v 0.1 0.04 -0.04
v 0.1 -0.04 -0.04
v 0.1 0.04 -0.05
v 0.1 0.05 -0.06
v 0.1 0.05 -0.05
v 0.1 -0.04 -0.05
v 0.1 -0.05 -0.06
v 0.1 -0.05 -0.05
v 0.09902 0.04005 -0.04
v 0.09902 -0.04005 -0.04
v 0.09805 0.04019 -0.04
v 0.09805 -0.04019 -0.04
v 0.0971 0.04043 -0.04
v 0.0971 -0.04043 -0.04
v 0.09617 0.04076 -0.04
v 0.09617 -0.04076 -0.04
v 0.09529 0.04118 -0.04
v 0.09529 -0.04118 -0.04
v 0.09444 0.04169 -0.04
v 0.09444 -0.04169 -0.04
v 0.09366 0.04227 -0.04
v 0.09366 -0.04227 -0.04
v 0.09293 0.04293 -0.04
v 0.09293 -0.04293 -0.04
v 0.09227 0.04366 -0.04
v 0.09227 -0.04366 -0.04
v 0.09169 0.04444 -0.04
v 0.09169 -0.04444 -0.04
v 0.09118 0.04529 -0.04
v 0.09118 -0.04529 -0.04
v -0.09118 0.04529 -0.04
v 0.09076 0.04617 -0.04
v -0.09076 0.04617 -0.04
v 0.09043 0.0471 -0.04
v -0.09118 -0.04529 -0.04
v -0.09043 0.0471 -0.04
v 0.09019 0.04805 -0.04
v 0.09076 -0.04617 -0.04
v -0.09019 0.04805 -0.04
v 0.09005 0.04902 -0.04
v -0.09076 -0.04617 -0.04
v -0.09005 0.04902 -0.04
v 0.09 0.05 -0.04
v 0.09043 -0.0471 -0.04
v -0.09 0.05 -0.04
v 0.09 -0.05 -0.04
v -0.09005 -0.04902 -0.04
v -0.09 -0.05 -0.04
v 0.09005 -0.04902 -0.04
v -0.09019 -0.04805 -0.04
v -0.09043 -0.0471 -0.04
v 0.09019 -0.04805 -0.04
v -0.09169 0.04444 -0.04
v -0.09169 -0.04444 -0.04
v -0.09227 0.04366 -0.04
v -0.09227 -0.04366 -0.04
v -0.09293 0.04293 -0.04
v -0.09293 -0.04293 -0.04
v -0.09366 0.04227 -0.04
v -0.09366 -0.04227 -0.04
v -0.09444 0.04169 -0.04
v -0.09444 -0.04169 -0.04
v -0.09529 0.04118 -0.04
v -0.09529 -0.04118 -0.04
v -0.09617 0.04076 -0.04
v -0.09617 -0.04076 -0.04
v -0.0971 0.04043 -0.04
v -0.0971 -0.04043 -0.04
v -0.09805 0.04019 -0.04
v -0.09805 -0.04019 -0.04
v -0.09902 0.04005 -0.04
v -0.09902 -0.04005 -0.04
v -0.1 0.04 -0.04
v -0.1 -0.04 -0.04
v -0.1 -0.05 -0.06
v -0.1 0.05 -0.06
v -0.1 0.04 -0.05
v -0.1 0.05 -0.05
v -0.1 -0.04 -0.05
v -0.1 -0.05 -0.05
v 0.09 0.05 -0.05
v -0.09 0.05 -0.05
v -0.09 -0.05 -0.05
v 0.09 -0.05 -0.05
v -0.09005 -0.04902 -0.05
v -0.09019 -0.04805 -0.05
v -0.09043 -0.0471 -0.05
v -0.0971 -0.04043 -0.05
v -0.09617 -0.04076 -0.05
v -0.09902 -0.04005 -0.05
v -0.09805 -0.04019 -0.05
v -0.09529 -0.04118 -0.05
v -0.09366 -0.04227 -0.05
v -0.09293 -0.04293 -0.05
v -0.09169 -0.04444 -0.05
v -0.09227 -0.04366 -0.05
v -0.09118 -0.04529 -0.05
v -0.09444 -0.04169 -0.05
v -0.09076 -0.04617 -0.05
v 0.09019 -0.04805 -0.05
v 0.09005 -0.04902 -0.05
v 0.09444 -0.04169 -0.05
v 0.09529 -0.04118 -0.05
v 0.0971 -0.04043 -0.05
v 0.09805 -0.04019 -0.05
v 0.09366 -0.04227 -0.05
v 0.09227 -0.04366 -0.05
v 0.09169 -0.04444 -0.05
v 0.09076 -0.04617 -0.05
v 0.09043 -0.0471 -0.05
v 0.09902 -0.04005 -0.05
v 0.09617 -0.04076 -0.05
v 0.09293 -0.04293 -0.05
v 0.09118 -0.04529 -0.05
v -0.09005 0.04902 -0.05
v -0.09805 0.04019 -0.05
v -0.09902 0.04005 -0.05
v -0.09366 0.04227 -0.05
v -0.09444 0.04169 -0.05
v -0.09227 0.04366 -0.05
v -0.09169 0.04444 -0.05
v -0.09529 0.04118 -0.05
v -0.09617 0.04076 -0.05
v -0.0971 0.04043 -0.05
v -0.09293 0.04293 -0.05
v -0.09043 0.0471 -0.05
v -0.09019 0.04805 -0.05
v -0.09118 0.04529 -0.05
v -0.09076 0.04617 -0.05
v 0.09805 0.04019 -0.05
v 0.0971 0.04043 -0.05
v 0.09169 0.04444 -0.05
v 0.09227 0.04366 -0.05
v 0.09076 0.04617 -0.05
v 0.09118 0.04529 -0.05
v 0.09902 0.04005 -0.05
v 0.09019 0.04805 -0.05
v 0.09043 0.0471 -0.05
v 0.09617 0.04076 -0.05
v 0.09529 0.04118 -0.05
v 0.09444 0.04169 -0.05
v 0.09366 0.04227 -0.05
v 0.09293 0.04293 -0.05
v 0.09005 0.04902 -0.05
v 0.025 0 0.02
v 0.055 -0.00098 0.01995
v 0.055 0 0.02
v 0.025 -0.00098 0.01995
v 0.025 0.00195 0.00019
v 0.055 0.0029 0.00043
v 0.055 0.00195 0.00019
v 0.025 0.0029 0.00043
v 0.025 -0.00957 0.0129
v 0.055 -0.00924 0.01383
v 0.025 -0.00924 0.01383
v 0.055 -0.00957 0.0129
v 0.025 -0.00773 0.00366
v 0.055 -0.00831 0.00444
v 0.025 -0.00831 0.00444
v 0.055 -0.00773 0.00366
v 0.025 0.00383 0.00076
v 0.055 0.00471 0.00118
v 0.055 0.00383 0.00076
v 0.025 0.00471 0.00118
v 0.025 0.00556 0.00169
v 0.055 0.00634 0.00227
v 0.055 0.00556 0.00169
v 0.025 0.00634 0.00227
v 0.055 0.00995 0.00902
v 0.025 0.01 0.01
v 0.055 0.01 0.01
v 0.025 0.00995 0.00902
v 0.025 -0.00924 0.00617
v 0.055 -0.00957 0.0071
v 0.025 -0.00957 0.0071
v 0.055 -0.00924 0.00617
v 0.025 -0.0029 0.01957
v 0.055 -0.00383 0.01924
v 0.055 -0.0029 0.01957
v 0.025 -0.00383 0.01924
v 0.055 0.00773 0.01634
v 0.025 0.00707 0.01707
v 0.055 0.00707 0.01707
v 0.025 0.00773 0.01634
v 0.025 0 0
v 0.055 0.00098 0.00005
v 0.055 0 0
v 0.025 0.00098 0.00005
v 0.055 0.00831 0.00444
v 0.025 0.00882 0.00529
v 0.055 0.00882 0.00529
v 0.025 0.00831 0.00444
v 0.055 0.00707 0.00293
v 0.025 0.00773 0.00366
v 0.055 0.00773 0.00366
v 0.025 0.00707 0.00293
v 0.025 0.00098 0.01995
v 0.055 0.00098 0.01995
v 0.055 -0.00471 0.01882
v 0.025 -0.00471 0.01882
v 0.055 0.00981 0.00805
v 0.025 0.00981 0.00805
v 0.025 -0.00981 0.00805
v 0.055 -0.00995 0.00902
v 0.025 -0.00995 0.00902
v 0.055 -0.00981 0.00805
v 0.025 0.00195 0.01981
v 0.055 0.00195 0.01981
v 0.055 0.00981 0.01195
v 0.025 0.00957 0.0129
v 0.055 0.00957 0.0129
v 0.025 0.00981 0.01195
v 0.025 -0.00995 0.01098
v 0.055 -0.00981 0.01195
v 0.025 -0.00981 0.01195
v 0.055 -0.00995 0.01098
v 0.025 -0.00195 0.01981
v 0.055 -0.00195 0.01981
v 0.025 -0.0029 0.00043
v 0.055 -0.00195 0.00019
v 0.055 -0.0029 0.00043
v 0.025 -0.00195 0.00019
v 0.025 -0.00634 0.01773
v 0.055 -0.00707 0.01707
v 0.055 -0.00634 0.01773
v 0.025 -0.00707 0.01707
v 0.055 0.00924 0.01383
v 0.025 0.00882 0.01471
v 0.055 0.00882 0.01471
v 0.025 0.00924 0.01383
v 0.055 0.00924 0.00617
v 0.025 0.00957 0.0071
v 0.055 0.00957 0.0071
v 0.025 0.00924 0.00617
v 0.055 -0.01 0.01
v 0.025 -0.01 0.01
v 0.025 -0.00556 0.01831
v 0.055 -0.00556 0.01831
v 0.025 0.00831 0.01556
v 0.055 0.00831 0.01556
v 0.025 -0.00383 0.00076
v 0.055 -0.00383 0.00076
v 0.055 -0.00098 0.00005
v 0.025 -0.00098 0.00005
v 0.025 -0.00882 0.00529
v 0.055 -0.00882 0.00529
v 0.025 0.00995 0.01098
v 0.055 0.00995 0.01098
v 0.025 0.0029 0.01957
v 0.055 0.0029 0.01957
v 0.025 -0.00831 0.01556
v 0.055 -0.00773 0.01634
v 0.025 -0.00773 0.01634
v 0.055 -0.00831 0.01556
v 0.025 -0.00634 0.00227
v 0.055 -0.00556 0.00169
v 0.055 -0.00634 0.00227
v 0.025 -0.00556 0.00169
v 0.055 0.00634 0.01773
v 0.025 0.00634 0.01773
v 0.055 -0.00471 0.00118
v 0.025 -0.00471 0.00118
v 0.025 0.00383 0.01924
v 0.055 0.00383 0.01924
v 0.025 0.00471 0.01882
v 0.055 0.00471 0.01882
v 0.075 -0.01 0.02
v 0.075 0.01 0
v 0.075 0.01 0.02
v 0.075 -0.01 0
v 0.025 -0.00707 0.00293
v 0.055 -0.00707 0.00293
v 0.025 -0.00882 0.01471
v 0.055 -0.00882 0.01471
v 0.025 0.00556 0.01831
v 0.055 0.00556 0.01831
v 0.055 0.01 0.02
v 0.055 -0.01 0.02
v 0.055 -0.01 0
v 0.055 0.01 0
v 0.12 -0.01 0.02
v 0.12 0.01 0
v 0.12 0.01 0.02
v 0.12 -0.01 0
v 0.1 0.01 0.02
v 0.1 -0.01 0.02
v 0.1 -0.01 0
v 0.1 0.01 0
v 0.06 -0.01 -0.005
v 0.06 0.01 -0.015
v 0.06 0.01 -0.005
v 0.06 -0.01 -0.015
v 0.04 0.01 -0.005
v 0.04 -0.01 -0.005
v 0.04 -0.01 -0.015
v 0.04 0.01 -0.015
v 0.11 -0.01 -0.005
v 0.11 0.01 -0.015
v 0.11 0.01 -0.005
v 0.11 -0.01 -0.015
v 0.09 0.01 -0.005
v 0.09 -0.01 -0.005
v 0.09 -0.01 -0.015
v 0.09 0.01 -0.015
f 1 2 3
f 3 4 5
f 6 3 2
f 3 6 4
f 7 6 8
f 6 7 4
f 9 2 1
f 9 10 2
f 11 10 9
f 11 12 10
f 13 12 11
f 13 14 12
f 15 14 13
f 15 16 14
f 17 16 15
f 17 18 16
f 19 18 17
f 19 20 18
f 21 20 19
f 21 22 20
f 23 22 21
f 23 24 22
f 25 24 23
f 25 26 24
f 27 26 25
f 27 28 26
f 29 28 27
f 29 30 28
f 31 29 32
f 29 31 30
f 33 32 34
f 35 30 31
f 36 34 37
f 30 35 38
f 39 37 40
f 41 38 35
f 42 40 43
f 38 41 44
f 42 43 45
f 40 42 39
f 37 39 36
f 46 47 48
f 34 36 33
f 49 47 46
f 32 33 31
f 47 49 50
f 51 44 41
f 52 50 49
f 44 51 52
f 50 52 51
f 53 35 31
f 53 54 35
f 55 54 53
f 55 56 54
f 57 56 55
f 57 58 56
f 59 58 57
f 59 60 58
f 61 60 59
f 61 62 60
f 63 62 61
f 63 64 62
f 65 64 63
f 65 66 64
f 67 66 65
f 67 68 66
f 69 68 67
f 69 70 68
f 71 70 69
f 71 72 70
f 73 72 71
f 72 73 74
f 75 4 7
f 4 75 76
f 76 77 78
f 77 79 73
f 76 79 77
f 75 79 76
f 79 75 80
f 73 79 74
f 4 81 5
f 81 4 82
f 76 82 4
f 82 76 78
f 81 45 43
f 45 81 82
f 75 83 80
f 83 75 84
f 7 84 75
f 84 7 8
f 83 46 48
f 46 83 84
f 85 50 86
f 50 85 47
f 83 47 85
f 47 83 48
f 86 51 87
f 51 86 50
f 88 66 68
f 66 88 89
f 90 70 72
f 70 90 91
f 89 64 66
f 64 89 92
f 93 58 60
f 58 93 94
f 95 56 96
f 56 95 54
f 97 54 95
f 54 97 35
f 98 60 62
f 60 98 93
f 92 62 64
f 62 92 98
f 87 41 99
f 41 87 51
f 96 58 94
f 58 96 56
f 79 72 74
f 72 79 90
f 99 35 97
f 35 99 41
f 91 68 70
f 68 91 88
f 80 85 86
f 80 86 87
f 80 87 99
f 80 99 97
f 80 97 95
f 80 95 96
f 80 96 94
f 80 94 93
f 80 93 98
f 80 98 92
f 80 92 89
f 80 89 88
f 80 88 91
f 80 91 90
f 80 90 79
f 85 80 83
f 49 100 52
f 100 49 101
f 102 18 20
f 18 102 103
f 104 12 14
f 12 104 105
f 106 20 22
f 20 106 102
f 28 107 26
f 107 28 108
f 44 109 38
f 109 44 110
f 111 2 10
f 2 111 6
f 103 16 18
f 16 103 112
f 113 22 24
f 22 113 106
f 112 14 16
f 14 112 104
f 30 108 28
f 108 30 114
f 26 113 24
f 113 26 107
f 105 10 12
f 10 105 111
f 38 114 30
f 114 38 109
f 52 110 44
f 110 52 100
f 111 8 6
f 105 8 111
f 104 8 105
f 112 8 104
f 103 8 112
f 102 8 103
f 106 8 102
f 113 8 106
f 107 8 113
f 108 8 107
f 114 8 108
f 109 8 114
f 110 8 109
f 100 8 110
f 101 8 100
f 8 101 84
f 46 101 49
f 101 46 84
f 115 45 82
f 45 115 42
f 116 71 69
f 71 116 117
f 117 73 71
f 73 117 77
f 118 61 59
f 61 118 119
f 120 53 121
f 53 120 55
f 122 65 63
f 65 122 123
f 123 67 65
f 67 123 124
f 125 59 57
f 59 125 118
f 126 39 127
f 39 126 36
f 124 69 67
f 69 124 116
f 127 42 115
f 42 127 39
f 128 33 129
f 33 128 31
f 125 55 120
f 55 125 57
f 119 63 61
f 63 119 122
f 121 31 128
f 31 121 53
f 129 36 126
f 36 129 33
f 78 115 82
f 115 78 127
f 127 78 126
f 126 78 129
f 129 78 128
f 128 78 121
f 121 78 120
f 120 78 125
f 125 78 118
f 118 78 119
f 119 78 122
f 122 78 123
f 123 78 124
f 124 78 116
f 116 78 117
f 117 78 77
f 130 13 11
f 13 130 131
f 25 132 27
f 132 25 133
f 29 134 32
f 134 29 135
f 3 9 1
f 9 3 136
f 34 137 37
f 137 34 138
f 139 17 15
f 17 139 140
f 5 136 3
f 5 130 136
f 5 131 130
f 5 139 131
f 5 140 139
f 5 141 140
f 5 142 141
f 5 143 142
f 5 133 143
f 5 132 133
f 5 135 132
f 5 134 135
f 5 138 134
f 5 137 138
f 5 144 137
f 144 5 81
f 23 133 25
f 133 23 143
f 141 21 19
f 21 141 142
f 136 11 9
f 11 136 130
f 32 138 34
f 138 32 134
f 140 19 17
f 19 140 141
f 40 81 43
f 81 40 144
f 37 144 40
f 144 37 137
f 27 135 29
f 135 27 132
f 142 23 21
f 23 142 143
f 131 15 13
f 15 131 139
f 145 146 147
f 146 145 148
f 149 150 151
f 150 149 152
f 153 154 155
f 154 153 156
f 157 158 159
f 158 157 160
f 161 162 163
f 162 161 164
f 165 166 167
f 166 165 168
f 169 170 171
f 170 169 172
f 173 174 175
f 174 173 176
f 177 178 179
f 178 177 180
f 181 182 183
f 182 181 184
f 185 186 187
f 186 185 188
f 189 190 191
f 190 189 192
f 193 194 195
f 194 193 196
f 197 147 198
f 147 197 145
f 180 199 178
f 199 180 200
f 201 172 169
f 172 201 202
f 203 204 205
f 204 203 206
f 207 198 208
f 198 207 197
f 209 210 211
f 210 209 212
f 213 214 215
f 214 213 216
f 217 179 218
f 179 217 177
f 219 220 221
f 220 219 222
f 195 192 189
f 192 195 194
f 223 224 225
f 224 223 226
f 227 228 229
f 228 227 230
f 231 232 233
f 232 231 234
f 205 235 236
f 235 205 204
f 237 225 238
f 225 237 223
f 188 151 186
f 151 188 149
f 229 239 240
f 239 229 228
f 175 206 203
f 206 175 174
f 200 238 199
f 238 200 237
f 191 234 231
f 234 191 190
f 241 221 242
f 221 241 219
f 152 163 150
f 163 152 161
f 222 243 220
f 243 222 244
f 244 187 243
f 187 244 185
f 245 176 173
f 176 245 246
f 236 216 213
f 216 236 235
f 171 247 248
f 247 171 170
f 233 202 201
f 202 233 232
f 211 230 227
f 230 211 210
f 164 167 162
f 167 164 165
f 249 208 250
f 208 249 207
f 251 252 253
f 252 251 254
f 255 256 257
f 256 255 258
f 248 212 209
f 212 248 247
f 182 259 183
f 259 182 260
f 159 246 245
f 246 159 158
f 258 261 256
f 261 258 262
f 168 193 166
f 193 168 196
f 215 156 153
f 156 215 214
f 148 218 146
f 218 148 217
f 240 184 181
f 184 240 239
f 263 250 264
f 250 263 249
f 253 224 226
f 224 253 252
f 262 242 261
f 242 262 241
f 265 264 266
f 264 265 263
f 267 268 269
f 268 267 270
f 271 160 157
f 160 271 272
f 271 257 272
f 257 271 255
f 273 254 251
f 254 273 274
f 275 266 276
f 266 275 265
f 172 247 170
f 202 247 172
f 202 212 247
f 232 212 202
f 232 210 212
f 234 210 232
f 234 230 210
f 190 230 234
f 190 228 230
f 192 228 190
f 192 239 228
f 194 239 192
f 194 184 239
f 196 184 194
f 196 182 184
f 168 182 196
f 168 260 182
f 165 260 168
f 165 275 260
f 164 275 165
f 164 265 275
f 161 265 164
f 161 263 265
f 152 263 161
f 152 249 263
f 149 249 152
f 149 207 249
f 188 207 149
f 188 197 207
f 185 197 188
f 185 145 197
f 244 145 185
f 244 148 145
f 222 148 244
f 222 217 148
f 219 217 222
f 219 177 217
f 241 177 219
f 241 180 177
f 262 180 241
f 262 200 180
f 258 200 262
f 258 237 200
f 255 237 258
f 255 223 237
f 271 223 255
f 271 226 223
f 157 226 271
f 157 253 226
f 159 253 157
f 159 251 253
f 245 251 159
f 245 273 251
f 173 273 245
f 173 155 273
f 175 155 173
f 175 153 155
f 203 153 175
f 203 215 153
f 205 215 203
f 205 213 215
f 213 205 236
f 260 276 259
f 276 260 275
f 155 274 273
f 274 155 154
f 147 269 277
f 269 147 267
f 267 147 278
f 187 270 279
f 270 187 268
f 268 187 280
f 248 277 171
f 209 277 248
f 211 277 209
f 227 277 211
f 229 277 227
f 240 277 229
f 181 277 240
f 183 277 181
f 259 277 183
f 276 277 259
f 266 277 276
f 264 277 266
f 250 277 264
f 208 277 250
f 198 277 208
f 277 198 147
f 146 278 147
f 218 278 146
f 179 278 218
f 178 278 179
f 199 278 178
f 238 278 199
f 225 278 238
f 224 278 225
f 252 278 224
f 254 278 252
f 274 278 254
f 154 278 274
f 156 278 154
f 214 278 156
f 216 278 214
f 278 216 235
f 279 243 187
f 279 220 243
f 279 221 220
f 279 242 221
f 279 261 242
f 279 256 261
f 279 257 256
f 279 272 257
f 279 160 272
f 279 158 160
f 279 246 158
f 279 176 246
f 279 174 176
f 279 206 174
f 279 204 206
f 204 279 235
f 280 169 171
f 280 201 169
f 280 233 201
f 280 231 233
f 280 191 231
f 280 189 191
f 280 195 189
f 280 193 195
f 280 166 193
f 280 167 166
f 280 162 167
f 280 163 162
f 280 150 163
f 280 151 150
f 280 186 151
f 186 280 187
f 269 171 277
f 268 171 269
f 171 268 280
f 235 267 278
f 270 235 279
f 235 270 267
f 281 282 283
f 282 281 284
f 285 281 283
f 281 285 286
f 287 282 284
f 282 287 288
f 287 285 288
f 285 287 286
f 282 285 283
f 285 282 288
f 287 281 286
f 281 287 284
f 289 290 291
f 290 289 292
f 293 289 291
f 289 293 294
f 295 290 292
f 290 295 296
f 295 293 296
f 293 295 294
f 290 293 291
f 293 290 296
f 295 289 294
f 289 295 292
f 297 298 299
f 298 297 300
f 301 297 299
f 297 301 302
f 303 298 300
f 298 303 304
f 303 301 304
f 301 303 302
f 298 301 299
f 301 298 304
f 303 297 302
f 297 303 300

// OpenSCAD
module rounded_rectangle_base(length, width, height, radius) {
    difference() {
        cube([length, width, height], center = true);
        translate([-length/2, -width/2, 0])
            cylinder(h = height, r = radius, center = false, $fn = 64);
        translate([length/2, -width/2, 0])
            cylinder(h = height, r = radius, center = false, $fn = 64);
        translate([-length/2, width/2, 0])
            cylinder(h = height, r = radius, center = false, $fn = 64);
        translate([length/2, width/2, 0])
            cylinder(h = height, r = radius, center = false, $fn = 64);
    }
}

module cantilever_arm(length, width, height, radius) {
    translate([0, 0, height/2])
        rotate([0, 90, 0])
            cylinder(h = length, r = radius, center = true, $fn = 64);
    translate([length/2 - radius, 0, height/2])
        cube([radius*2, width, height], center = true);
}

module end_pad(length, width, height) {
    translate([length/2, 0, height/2])
        cube([length, width, height], center = true);
}

module boss(width, height, depth) {
    cube([width, depth, height], center = true);
}

module mounting_bracket() {
    union() {
        translate([0, 0, -0.05])
            rounded_rectangle_base(0.2, 0.1, 0.02, 0.01);
        translate([0.05, 0, 0])
            cantilever_arm(0.05, 0.02, 0.02, 0.01);
        translate([0.1, 0, 0])
            end_pad(0.02, 0.02, 0.02);
        translate([0.05, 0, -0.01])
            boss(0.02, 0.01, 0.02);
        translate([0.1, 0, -0.01])
            boss(0.02, 0.01, 0.02);
    }
}

mounting_bracket();
